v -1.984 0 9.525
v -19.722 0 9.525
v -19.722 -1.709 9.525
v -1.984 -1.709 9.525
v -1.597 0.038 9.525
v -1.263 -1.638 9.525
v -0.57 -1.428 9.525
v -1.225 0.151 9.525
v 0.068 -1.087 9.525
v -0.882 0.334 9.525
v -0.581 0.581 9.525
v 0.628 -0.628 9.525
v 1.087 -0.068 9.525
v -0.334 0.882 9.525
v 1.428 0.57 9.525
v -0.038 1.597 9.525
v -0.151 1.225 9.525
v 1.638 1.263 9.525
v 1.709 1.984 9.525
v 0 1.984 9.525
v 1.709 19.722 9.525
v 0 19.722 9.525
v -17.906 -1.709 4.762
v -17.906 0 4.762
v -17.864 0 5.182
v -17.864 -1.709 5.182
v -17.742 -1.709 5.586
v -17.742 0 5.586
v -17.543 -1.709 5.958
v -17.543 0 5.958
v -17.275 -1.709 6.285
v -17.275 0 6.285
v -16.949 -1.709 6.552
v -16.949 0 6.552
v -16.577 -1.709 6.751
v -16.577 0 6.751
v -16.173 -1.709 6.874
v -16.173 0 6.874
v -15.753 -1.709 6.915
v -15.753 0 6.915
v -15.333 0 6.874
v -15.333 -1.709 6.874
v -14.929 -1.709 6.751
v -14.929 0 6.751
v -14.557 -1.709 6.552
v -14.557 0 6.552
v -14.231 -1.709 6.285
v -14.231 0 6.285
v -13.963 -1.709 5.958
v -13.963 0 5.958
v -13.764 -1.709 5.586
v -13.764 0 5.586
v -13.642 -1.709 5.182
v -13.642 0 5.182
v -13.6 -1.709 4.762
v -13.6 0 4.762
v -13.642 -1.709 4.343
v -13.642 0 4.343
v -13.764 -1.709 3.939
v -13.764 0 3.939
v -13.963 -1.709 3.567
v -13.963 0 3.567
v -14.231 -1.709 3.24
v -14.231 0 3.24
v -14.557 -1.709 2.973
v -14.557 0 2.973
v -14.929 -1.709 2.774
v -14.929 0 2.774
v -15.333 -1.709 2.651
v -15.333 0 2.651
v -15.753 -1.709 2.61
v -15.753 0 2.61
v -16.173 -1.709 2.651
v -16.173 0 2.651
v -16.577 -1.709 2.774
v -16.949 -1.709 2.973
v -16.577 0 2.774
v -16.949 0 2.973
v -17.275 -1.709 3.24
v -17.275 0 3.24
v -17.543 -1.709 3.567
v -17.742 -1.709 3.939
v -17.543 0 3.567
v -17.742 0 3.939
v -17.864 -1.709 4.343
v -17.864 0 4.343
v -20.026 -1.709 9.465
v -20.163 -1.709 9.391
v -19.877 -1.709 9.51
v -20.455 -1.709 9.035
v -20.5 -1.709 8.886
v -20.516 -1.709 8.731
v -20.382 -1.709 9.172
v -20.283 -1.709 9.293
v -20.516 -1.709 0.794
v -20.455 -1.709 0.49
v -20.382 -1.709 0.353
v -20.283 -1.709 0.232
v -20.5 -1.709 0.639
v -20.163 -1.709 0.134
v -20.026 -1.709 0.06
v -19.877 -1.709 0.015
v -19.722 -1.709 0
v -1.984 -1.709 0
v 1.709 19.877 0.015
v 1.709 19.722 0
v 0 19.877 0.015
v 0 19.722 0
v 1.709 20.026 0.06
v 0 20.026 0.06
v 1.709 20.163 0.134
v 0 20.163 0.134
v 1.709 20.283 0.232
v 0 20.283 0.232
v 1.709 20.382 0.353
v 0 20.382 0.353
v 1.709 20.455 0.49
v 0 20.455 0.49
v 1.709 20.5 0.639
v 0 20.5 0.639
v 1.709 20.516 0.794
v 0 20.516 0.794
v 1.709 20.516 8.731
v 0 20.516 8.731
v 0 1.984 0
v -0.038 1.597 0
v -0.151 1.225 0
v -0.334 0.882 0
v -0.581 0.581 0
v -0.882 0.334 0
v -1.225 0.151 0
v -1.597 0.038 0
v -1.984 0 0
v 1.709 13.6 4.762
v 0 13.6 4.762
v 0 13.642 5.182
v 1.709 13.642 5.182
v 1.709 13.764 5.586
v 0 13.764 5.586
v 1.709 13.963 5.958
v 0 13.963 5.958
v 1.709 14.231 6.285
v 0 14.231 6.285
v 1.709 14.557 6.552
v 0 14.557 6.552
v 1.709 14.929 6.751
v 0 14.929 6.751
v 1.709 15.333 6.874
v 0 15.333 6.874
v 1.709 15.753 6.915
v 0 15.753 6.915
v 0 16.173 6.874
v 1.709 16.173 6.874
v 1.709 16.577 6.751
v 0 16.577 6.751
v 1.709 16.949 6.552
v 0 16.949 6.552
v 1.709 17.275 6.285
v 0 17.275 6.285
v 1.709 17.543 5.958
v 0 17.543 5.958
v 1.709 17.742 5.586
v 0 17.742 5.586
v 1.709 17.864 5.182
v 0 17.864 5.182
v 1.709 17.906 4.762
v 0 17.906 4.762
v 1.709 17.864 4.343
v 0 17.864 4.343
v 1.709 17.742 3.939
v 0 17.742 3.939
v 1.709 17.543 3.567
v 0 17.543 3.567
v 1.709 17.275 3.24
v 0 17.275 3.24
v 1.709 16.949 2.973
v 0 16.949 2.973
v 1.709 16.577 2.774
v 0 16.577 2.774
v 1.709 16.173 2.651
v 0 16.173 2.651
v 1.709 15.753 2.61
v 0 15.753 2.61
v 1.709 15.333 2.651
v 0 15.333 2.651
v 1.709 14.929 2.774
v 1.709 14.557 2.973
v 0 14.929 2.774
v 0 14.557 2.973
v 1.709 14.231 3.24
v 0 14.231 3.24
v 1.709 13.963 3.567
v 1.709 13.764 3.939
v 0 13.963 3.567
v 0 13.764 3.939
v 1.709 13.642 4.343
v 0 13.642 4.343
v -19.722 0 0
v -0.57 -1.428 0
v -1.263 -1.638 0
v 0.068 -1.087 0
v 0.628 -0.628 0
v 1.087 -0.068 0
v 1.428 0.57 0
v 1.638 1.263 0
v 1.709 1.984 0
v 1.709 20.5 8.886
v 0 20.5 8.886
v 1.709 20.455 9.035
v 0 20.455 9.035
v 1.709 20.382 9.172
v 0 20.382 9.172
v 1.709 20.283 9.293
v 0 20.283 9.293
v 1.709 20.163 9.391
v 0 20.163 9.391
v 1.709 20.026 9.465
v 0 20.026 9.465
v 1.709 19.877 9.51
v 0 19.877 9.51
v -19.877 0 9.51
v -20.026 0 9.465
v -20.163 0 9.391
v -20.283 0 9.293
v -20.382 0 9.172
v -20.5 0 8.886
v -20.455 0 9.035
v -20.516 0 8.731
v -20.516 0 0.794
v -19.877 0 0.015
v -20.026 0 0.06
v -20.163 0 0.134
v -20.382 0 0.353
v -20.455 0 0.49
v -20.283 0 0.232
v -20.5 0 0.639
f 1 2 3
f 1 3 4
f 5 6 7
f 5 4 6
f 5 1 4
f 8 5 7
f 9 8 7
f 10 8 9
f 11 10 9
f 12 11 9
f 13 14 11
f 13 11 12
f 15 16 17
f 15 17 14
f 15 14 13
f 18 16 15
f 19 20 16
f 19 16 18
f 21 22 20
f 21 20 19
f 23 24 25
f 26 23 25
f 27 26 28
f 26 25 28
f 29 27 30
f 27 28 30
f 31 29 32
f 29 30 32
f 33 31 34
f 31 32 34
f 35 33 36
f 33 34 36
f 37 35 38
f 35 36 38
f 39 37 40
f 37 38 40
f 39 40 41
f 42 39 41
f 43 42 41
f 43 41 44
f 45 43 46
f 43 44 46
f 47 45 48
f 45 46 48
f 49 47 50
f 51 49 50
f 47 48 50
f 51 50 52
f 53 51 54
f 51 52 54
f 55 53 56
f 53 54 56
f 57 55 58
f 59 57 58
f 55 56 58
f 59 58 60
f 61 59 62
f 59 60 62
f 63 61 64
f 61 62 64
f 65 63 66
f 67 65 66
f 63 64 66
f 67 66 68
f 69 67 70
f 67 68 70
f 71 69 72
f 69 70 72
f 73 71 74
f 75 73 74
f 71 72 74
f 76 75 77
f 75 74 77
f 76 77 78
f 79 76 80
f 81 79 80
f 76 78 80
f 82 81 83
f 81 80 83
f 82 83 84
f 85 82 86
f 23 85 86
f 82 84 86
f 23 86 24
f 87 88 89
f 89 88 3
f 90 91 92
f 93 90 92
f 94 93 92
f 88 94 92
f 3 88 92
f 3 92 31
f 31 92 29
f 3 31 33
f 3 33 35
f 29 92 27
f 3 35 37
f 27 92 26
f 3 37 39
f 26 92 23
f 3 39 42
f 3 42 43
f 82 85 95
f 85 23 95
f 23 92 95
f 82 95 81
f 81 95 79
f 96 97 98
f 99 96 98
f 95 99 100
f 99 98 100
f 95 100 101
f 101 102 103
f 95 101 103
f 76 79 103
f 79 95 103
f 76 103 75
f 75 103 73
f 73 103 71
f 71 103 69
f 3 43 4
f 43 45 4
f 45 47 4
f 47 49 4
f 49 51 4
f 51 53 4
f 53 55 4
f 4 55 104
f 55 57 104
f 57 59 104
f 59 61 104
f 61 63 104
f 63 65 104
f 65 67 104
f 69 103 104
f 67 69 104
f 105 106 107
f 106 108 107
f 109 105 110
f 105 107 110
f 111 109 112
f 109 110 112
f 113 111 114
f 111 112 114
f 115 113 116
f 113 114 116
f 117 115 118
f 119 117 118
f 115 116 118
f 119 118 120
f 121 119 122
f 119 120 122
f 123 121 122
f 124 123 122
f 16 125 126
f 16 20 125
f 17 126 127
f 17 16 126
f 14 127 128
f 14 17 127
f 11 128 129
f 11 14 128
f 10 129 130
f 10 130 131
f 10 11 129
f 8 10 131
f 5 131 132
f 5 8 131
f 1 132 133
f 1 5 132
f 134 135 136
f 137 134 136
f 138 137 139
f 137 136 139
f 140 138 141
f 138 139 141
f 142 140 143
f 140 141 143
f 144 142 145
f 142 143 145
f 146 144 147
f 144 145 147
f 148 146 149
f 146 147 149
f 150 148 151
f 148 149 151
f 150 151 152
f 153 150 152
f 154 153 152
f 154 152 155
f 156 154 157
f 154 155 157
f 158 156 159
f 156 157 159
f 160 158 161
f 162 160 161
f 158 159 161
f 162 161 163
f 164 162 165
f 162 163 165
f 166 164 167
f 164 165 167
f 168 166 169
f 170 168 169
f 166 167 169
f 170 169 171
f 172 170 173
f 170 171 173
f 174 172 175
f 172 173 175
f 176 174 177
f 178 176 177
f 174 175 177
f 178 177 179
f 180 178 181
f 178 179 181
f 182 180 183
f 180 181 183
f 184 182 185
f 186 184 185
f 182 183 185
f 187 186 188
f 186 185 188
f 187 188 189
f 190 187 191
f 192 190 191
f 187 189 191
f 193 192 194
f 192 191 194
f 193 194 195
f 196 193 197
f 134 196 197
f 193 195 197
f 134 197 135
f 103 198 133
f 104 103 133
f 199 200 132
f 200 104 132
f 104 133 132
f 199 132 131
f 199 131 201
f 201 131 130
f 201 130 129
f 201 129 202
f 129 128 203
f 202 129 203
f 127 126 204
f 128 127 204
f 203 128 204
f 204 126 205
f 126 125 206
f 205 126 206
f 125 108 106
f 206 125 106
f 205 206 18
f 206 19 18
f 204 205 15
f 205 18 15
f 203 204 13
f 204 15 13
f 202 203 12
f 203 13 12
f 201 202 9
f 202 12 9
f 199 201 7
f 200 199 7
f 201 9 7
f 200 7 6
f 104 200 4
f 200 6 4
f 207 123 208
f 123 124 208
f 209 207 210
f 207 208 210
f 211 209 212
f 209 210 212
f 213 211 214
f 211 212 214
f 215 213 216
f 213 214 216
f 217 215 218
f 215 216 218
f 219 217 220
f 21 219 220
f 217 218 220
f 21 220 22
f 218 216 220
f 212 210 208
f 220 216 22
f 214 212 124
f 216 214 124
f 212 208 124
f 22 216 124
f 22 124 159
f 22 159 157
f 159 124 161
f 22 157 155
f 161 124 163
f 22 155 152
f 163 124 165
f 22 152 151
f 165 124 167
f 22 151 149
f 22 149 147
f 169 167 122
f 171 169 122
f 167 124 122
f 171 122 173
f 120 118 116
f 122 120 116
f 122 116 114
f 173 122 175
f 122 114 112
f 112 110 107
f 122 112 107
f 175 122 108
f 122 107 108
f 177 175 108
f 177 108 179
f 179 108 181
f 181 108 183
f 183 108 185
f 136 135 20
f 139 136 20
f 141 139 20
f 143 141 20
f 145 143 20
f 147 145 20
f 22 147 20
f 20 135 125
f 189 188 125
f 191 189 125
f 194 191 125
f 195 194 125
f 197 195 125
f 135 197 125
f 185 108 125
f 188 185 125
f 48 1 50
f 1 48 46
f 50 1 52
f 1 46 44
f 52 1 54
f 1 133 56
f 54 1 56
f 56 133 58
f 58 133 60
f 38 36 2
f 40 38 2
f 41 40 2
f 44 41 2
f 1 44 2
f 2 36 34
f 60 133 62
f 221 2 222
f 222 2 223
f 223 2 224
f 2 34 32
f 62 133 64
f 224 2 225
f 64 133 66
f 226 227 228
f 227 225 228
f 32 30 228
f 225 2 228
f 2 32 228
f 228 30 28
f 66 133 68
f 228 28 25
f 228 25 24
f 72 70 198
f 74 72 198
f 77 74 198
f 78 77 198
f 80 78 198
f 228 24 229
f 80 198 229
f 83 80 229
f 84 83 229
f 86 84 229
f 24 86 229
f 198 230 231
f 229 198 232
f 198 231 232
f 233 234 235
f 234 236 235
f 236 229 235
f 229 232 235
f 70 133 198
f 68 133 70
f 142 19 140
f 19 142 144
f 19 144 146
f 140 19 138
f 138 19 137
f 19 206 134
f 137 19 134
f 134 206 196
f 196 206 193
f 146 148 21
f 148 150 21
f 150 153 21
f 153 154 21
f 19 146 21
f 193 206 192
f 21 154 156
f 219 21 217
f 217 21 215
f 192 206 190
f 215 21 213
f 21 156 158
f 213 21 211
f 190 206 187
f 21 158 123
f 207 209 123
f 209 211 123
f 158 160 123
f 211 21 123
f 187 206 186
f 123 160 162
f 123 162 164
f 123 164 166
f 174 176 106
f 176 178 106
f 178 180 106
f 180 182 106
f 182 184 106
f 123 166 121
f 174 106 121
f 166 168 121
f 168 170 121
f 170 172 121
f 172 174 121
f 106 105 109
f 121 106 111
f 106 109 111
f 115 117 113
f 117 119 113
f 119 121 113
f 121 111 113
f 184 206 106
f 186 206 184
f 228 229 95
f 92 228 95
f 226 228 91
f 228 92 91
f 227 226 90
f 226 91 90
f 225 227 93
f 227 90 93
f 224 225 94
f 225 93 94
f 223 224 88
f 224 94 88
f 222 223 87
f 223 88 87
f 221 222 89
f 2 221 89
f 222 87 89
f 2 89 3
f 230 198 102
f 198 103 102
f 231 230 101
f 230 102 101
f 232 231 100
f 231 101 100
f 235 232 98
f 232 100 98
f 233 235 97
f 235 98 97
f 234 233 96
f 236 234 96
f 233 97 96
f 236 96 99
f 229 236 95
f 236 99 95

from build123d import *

# Parameters (mm, degrees)
F1_DEPTH = 9.525
F2_R     = 1.98374
F3_R     = 3.69316
F4_R     = 2.15265
F5_DEPTH = 1.70942
F6_R     = 2.15265
F7_DEPTH = 1.70942
F8_R     = 0.79375


with BuildPart() as f1:
    # F0 (on Top) → F1 (new body)
    with BuildSketch(Plane.XY):
        Polygon((0, 20.51558), (0, 0), (-20.51558, 0), (-20.51558, -1.70942), (1.70942, -1.70942), (1.70942, 20.51558), align=None)
    extrude(amount=F1_DEPTH)

    # F2
    f2_edges = [f1.edges().sort_by_distance(p)[0] for p in [
        (0, 0, 4.7625),
    ]]
    fillet(f2_edges, radius=F2_R)

    # F3
    f3_edges = [f1.edges().sort_by_distance(p)[0] for p in [
        (1.70942, -1.70942, 4.7625),
    ]]
    fillet(f3_edges, radius=F3_R)

    # F4 (on face) → F5 (cut, through all)
    with BuildSketch(Plane(origin=(0, 0, 0), x_dir=(-1, 0, 0), z_dir=(0, 1, 0))):
        with Locations((15.75308, 4.7625)):
            Circle(F4_R)
    extrude(amount=-F5_DEPTH, mode=Mode.SUBTRACT)

    # F6 (on face) → F7 (cut, through all)
    with BuildSketch(Plane(origin=(0, 0, 0), x_dir=(0, -1, 0), z_dir=(-1, 0, 0))):
        with Locations((-15.75308, 4.7625)):
            Circle(F6_R)
    extrude(amount=-F7_DEPTH, mode=Mode.SUBTRACT)

    # F8
    f8_edges = [f1.edges().sort_by_distance(p)[0] for p in [
        (0.85471, 20.51558, 0),
        (0.85471, 20.51558, 9.525),
        (-20.51558, -0.85471, 9.525),
        (-20.51558, -0.85471, 0),
    ]]
    fillet(f8_edges, radius=F8_R)


solid = f1.part
